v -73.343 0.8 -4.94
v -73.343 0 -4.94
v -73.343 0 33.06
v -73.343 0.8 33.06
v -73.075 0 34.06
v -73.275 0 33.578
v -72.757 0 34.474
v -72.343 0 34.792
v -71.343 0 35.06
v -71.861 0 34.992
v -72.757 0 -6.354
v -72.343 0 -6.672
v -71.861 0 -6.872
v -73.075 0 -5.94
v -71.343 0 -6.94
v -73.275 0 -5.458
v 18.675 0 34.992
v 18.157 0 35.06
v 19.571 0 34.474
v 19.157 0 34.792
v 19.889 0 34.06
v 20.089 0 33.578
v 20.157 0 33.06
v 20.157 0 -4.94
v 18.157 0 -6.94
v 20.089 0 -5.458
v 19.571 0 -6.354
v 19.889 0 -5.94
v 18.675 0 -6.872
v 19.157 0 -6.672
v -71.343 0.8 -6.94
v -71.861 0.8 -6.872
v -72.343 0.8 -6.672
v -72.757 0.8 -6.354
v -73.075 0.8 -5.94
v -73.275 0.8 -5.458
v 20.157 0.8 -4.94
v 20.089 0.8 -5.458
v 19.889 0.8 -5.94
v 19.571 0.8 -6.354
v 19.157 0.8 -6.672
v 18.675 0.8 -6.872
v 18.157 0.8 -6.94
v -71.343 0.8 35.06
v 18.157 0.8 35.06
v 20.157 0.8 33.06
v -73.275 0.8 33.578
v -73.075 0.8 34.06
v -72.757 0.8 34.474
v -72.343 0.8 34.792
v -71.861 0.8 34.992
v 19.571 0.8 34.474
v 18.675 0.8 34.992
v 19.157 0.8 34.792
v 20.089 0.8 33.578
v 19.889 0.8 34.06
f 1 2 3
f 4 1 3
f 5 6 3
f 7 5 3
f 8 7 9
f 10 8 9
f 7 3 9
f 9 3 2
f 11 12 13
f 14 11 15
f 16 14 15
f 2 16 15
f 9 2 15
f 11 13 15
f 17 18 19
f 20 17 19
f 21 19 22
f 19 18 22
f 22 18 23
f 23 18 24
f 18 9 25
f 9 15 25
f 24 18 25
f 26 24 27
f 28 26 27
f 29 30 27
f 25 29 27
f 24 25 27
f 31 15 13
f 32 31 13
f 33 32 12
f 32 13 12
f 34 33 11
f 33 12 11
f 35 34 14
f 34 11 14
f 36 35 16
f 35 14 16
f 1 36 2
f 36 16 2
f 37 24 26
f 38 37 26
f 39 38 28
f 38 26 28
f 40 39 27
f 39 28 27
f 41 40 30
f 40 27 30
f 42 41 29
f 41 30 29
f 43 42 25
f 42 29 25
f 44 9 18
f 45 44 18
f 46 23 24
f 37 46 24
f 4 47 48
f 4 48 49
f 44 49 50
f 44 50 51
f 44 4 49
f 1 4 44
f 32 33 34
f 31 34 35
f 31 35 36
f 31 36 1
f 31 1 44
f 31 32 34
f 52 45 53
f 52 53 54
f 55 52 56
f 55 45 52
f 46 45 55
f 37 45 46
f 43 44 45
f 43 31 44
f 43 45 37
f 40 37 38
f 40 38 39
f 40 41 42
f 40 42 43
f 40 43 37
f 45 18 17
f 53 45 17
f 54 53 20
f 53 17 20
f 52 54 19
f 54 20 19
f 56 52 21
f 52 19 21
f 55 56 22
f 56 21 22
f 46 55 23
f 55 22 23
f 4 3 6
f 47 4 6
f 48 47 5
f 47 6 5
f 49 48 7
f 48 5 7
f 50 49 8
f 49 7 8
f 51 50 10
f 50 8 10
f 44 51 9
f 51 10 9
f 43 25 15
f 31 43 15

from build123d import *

# Parameters (mm, degrees)
EXTRUDE_1_DEPTH = 0.8


with BuildPart() as part:
    # 草图1 → 凸台-拉伸1 (new body)
    with BuildSketch(Plane(origin=(0, 0, 0), x_dir=(1, 0, 0), z_dir=(0, 1, 0))):
        with BuildLine():
            Line((-71.34309172, -35.060089169), (18.15690828, -35.060089169))
            ThreePointArc((18.15690828, -35.060089169), (19.571121842, -34.474302732), (20.15690828, -33.060089169))
            Line((20.15690828, -33.060089169), (20.15690828, 4.939910831))
            ThreePointArc((20.15690828, 4.939910831), (19.571121842, 6.354124393), (18.15690828, 6.939910831))
            Line((18.15690828, 6.939910831), (-71.34309172, 6.939910831))
            ThreePointArc((-71.34309172, 6.939910831), (-72.757305283, 6.354124393), (-73.34309172, 4.939910831))
            Line((-73.34309172, 4.939910831), (-73.34309172, -33.060089169))
            ThreePointArc((-73.34309172, -33.060089169), (-72.757305283, -34.474302732), (-71.34309172, -35.060089169))
        make_face()
    extrude(amount=EXTRUDE_1_DEPTH)


solid = part.part
